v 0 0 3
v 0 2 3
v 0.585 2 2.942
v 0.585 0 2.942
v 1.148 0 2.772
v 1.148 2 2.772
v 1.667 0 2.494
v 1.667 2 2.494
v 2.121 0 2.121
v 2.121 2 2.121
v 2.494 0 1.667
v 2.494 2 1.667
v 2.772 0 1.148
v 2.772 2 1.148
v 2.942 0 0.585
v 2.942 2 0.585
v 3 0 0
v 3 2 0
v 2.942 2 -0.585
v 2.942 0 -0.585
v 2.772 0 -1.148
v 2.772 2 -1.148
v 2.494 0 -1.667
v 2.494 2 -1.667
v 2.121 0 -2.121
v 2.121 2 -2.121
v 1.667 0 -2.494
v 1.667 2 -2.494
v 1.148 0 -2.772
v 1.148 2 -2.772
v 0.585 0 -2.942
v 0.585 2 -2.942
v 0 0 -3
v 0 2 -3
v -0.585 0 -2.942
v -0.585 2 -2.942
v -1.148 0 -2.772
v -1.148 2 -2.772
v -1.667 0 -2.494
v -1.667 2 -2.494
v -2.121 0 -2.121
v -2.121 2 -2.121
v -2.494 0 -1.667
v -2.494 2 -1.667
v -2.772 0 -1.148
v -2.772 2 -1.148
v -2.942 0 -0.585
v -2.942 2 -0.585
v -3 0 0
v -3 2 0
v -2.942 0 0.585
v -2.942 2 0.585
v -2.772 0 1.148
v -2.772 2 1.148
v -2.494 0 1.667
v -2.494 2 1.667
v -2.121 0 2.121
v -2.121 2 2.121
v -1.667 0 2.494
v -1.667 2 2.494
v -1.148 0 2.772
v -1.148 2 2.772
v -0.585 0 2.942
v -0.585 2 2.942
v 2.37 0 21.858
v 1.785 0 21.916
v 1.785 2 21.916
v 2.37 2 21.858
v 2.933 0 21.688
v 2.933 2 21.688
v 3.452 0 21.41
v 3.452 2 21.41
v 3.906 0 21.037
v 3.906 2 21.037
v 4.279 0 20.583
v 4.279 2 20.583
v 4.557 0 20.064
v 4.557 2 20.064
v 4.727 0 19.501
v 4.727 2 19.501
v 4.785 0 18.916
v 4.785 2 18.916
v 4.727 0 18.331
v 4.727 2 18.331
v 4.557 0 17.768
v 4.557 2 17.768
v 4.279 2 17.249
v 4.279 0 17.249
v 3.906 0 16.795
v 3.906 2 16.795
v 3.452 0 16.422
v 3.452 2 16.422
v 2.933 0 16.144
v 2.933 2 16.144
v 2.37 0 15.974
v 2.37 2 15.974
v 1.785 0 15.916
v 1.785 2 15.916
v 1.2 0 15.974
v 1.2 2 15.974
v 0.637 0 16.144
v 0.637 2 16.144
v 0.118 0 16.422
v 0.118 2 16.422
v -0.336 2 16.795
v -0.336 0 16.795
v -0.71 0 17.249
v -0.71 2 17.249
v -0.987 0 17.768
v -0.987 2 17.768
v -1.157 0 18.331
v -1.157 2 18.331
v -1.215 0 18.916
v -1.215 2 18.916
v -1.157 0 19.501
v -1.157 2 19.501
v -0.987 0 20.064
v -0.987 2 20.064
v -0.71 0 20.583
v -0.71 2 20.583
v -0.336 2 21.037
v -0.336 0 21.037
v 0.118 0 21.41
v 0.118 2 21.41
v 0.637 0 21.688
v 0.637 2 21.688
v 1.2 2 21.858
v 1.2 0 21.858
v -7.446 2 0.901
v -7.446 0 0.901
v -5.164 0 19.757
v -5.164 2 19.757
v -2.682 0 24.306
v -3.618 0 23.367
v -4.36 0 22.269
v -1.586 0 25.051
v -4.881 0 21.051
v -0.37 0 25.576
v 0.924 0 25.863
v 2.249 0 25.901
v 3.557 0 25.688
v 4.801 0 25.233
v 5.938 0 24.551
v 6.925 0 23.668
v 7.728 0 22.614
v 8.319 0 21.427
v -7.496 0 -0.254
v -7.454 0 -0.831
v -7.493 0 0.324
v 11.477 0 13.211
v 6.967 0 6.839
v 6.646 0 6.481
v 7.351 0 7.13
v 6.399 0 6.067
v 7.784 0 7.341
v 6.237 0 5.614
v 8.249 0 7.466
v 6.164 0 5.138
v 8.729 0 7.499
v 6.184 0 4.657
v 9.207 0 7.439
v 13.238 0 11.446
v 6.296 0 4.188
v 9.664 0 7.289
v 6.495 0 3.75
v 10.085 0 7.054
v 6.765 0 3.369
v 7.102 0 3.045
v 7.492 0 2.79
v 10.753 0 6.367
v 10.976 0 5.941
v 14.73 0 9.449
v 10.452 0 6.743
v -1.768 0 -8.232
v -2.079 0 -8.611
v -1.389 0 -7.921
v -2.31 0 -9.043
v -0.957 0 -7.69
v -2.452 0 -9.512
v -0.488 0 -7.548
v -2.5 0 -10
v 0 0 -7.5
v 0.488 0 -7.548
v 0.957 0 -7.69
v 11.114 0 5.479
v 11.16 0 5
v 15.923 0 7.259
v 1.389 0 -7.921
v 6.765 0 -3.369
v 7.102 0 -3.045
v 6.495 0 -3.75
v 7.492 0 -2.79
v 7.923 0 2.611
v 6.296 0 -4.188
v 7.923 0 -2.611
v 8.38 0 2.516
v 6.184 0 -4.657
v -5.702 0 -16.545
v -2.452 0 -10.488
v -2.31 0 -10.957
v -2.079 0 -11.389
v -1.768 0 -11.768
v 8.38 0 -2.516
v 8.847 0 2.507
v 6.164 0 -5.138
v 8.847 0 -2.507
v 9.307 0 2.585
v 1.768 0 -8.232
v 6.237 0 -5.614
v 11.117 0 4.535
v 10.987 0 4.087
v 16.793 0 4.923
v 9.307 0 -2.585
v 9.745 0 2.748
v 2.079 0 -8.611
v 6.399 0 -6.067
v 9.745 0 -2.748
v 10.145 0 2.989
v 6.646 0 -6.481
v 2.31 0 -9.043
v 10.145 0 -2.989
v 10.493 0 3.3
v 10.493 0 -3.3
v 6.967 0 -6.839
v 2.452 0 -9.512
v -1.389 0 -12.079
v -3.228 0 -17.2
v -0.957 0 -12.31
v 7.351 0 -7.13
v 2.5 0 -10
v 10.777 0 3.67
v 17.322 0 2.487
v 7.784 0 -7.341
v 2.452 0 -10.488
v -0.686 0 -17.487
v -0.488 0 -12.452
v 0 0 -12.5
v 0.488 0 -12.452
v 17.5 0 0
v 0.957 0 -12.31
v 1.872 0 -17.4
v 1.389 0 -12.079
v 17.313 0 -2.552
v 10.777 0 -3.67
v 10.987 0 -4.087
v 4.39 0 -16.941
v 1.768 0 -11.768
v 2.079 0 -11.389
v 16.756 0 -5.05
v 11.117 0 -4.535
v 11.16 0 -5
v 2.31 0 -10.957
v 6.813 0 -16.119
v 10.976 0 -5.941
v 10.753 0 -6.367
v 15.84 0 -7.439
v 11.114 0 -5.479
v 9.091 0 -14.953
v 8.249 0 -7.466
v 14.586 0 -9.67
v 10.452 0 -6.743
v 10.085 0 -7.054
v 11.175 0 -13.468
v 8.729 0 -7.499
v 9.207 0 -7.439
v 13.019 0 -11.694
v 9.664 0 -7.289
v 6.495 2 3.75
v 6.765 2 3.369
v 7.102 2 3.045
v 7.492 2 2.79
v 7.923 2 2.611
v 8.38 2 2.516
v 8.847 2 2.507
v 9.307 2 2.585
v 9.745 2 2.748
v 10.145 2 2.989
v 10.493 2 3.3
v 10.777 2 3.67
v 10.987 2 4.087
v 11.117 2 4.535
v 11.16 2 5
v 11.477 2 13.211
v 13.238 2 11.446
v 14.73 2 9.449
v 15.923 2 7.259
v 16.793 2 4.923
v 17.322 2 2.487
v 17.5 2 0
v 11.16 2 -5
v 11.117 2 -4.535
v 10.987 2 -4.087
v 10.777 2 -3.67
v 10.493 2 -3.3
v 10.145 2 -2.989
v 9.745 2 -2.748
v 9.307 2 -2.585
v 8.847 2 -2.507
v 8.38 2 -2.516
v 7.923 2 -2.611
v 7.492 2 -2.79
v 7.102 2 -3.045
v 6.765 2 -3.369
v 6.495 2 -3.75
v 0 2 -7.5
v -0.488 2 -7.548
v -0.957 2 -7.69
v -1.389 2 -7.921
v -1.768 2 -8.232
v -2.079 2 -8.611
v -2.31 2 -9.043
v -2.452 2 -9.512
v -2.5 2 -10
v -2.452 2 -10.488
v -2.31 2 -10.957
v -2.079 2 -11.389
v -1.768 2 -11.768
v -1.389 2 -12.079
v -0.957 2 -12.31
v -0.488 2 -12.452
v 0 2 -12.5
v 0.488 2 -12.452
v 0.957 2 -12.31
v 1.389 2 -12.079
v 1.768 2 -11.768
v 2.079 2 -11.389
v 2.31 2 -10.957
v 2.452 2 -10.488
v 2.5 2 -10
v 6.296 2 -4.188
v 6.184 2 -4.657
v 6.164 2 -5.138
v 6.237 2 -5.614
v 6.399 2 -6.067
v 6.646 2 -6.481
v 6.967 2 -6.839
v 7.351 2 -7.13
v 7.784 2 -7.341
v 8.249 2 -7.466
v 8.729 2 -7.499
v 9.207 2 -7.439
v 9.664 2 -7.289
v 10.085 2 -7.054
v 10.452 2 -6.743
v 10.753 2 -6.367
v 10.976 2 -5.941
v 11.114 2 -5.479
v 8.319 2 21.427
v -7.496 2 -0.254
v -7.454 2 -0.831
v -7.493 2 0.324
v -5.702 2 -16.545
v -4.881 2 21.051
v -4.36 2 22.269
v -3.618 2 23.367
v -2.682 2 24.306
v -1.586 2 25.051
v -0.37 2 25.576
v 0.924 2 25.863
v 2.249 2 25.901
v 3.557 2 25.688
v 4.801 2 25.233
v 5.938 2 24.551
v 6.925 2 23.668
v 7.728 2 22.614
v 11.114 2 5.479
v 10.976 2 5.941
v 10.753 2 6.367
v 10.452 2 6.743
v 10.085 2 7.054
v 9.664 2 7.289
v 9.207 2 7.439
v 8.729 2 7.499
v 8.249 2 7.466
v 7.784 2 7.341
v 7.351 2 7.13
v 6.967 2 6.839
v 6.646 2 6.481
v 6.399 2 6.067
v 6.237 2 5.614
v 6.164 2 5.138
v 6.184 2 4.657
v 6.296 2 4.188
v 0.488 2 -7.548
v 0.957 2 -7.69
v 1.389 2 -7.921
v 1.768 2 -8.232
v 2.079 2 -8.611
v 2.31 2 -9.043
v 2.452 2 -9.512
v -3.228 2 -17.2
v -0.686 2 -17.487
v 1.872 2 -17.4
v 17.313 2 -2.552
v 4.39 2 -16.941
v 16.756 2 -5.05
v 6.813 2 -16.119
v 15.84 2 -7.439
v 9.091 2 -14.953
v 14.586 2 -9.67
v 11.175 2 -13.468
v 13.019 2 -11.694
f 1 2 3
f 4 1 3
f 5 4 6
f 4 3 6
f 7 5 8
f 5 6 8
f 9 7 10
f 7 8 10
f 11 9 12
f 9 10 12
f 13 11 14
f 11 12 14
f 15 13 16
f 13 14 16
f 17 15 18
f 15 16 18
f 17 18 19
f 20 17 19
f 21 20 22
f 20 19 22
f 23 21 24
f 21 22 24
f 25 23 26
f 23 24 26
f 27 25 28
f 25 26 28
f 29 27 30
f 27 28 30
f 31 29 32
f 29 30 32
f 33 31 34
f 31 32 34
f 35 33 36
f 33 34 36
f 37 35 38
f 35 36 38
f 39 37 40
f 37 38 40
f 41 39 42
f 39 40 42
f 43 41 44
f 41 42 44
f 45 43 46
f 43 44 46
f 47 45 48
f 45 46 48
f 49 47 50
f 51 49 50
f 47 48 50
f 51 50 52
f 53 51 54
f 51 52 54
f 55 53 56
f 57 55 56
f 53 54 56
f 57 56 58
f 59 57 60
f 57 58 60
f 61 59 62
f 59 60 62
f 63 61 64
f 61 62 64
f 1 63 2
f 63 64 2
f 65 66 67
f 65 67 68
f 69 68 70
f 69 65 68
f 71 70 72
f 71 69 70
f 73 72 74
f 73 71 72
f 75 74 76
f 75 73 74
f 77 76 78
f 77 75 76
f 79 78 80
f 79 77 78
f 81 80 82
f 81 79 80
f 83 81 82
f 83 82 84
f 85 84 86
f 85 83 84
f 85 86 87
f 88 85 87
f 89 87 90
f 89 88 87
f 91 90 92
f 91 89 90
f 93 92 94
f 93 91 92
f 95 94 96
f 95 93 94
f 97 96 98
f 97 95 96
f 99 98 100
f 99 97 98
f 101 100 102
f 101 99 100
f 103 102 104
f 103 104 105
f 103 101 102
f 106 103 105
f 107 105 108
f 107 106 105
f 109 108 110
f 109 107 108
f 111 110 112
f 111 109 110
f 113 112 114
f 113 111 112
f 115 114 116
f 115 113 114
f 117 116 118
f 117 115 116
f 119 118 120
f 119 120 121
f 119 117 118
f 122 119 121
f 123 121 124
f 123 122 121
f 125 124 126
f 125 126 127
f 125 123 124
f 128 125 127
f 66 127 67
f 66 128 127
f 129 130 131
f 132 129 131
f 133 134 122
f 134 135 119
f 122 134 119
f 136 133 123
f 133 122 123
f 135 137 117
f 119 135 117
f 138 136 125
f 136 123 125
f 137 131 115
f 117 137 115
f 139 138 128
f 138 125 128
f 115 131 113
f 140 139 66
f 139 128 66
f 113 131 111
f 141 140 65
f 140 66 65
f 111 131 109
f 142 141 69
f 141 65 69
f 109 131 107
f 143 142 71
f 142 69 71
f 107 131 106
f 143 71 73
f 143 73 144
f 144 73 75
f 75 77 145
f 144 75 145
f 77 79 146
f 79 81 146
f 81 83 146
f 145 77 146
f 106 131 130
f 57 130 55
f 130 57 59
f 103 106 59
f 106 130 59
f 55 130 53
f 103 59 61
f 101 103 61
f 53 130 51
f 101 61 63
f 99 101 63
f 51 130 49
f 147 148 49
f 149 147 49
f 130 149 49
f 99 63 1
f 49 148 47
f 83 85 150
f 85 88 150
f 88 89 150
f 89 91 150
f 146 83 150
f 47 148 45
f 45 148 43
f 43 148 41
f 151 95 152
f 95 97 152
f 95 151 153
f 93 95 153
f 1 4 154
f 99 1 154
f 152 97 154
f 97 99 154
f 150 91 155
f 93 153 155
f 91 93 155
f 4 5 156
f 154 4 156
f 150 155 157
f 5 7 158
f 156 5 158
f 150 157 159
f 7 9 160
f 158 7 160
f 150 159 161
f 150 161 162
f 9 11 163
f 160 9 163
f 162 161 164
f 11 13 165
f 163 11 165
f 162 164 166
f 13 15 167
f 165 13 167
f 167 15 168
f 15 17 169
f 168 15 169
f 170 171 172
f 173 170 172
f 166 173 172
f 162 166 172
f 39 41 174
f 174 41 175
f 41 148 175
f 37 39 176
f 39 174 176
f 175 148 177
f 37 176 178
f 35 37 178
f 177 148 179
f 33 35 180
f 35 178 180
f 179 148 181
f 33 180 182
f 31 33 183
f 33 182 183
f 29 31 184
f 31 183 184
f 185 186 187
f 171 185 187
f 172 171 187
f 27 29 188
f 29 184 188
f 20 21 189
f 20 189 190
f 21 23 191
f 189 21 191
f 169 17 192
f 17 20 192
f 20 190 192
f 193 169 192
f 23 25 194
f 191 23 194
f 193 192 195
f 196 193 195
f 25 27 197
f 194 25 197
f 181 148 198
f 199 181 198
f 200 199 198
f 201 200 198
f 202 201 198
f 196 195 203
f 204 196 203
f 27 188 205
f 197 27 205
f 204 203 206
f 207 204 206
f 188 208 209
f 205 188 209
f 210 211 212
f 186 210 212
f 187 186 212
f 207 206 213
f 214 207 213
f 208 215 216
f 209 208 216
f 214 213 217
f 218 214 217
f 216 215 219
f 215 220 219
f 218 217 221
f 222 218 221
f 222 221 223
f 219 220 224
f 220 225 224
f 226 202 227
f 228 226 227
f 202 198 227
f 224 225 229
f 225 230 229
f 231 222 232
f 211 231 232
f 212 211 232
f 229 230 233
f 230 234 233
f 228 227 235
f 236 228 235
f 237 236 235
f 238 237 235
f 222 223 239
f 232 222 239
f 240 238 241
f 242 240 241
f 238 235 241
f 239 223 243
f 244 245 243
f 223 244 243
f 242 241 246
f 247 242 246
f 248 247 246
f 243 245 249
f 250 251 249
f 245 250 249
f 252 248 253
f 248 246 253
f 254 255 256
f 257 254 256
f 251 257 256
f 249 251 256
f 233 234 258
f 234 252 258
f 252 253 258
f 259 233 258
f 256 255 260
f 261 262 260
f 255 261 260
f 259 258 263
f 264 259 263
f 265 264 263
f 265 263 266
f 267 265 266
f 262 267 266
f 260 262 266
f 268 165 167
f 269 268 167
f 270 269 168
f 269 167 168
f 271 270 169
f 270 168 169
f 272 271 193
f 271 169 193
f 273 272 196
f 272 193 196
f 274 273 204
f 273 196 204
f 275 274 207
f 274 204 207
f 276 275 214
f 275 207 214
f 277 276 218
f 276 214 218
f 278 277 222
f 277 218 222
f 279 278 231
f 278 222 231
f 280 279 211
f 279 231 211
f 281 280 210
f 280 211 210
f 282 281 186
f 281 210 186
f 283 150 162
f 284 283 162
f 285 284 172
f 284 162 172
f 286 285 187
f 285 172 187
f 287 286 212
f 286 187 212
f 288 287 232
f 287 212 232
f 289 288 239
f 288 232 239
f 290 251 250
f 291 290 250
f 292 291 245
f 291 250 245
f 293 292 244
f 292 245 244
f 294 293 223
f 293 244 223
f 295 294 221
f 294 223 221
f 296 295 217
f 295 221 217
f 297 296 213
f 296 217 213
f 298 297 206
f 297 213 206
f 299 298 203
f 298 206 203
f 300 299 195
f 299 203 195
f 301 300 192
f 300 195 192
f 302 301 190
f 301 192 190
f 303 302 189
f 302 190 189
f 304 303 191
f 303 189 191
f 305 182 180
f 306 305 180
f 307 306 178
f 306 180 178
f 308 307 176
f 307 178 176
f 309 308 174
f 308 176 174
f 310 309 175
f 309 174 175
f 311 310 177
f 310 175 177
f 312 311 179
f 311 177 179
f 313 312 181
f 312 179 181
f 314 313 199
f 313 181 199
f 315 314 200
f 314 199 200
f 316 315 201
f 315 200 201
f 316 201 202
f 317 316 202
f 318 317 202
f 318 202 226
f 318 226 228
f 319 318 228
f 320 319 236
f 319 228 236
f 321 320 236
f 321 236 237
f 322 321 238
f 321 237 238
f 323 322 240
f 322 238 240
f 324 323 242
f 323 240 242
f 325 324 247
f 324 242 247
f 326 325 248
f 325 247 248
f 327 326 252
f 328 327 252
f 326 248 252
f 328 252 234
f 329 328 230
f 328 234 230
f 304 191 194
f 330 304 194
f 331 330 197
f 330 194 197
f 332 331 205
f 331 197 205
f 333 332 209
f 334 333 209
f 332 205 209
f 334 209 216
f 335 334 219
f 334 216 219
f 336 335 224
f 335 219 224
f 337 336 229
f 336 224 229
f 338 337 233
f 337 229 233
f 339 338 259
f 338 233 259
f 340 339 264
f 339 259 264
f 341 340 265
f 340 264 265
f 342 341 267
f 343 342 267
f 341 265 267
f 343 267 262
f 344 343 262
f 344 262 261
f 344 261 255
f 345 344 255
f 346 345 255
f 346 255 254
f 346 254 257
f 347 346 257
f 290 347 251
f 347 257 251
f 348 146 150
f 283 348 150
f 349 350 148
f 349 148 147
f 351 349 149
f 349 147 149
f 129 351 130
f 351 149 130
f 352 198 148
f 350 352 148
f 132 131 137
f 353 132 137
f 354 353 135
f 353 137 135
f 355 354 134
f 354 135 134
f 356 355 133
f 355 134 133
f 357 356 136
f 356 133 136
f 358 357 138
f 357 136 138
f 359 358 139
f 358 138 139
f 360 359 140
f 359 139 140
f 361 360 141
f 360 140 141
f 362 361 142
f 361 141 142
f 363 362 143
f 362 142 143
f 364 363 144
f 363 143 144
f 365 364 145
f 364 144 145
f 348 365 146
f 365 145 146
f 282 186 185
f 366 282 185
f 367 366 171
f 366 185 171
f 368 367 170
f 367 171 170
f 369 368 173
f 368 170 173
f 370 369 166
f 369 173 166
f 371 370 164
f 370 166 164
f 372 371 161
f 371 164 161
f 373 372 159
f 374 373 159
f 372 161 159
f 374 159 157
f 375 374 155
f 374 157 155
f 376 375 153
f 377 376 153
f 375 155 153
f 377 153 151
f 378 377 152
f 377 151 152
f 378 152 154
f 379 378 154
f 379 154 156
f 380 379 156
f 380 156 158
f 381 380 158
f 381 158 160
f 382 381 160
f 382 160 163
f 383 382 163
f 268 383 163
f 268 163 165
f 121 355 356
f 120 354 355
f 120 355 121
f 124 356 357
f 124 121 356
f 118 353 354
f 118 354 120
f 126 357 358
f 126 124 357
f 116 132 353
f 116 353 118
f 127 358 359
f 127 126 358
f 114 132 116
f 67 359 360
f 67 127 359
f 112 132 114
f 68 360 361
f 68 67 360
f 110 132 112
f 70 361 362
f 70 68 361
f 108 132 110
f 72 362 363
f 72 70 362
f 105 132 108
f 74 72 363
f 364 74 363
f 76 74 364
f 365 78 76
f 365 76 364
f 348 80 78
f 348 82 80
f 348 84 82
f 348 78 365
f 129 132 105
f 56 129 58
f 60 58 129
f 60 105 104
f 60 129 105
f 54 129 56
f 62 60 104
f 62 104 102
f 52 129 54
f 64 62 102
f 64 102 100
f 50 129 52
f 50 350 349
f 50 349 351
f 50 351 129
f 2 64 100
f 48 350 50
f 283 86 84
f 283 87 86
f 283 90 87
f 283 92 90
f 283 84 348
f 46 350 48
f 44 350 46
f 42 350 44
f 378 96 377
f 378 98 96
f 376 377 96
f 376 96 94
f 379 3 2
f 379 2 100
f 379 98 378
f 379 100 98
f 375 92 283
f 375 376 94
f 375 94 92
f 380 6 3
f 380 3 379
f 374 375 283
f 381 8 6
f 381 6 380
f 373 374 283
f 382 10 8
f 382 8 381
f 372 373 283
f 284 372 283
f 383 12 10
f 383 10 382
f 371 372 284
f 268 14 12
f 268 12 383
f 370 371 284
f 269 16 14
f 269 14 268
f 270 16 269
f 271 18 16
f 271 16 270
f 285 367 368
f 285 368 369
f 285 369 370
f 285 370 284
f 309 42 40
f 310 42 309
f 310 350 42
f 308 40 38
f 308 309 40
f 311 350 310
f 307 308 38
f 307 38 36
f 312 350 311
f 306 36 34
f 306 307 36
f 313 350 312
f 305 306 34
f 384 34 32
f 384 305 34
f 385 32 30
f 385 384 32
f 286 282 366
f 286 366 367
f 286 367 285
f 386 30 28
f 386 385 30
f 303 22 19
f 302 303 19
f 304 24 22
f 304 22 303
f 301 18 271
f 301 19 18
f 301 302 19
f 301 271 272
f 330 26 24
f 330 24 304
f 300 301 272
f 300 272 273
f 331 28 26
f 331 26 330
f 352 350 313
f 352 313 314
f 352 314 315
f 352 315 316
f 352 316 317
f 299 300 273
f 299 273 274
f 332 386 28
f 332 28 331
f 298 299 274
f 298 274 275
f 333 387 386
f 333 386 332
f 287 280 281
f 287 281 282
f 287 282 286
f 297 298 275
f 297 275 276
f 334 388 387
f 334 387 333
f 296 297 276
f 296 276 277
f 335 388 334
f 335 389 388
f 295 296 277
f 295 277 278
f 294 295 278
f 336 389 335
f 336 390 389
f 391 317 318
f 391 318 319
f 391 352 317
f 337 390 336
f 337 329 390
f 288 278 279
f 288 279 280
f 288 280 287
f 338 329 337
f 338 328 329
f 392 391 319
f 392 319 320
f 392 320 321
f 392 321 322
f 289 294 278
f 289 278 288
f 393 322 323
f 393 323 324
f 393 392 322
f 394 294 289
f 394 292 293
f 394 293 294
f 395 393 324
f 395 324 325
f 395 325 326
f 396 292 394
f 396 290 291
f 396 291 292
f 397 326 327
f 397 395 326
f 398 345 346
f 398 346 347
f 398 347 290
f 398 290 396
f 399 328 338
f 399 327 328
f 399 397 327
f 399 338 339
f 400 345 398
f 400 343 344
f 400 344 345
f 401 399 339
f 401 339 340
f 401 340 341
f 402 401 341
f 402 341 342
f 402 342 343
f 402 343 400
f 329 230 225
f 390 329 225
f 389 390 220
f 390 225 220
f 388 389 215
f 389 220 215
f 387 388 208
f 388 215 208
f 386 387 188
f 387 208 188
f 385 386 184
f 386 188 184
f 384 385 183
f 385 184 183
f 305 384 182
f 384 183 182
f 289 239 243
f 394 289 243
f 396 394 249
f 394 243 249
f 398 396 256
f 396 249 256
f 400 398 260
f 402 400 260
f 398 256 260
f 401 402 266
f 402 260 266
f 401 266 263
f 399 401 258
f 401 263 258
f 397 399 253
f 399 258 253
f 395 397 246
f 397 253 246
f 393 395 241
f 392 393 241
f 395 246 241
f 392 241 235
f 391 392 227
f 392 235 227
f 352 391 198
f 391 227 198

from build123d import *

# Parameters (mm, degrees)
SKETCH_1_R          = 7.5
EXTRUDE_1_DEPTH     = 2
EXTRUDE_START       = -2
SKETCH_2_R          = 3
EXTRUDE_2_DEPTH     = 2
SKETCH_3_R          = 3
CUT_EXTRUDE_1_DEPTH = 2


with BuildPart() as part:
    # 草图1 → 凸台-拉伸1 (new body)
    # profile 1 of 2: a face of its own
    with BuildSketch(Plane(origin=(0, 0, 0), x_dir=(1, 0, 0), z_dir=(0, 1, 0))):
        Circle(SKETCH_1_R)
    # profile 2 of 2: a face of its own
    with BuildSketch(Plane(origin=(0, 0, 0), x_dir=(1, 0, 0), z_dir=(0, 1, 0))):
        with BuildLine():
            ThreePointArc((17.5, 0), (10.160196291, 14.248523128), (-5.702332724, 16.544890495))
            Line((-5.702332724, 16.544890495), (-7.453841227, 0.830813432))
            ThreePointArc((-7.453841227, 0.830813432), (-5.000944874, 5.589324679), (0, 7.5))
            ThreePointArc((0, 7.5), (3.750000007, 6.495190524), (6.495190536, 3.749999986))
            ThreePointArc((6.495190536, 3.749999986), (7.244443699, 1.94114283), (7.5, 0))
            ThreePointArc((7.5, 0), (7.244443692, -1.941142857), (6.495190509, -3.750000034))
            ThreePointArc((6.495190509, -3.750000034), (2.340024706, -7.125607649), (-3.007415076, -6.870622574))
            Line((-3.007415076, -6.870622574), (11.47712911, -13.210810248))
            ThreePointArc((11.47712911, -13.210810248), (15.923249659, -7.25948485), (17.5, 0))
        make_face()
        with BuildLine():
            ThreePointArc((11.160254038, -5), (8.013206444, -7.414814571), (6.495190509, -3.750000034))
            ThreePointArc((6.495190509, -3.750000034), (9.307301631, -2.585185429), (11.160254038, -5))
        make_face(mode=Mode.SUBTRACT)
        with BuildLine():
            ThreePointArc((11.160254038, 5), (9.307301658, 2.585185436), (6.495190536, 3.749999986))
            ThreePointArc((6.495190536, 3.749999986), (8.013206417, 7.414814564), (11.160254038, 5))
        make_face(mode=Mode.SUBTRACT)
        with BuildLine():
            ThreePointArc((2.5, 10), (1.767766953, 8.232233047), (0, 7.5))
            ThreePointArc((0, 7.5), (-1.767766953, 11.767766953), (2.5, 10))
        make_face(mode=Mode.SUBTRACT)
    extrude(amount=EXTRUDE_1_DEPTH)

    # 草图2 → 凸台-拉伸2 (add)
    with BuildSketch(Plane(origin=(0, 2, 0), x_dir=(1, 0, 0), z_dir=(0, 1, 0)).offset(EXTRUDE_START)):
        with BuildLine():
            ThreePointArc((-3.007415076, -6.870622574), (-6.018851538, -4.474754313), (-7.445705299, -0.90081774))
            Line((-7.445705299, -0.90081774), (-5.164424019, -19.756738712))
            ThreePointArc((-5.164424019, -19.756738712), (0.924105936, -25.862847589), (8.318844201, -21.427466138))
            Line((8.318844201, -21.427466138), (11.47712911, -13.210810248))
            Line((11.47712911, -13.210810248), (-3.007415076, -6.870622574))
        make_face()
        with Locations(Location((1.784900926, -18.915975489, 0), (0, 0, 270))):
            Circle(SKETCH_2_R, mode=Mode.SUBTRACT)
    extrude(amount=EXTRUDE_2_DEPTH)

    # 草图3 → 切除-拉伸1 (cut)
    with BuildSketch(Plane(origin=(0, 2, 0), x_dir=(1, 0, 0), z_dir=(0, 1, 0))):
        with Locations(Location((0, 0, 0), (0, 0, 270))):
            Circle(SKETCH_3_R)
    extrude(amount=-CUT_EXTRUDE_1_DEPTH, mode=Mode.SUBTRACT)


solid = part.part
